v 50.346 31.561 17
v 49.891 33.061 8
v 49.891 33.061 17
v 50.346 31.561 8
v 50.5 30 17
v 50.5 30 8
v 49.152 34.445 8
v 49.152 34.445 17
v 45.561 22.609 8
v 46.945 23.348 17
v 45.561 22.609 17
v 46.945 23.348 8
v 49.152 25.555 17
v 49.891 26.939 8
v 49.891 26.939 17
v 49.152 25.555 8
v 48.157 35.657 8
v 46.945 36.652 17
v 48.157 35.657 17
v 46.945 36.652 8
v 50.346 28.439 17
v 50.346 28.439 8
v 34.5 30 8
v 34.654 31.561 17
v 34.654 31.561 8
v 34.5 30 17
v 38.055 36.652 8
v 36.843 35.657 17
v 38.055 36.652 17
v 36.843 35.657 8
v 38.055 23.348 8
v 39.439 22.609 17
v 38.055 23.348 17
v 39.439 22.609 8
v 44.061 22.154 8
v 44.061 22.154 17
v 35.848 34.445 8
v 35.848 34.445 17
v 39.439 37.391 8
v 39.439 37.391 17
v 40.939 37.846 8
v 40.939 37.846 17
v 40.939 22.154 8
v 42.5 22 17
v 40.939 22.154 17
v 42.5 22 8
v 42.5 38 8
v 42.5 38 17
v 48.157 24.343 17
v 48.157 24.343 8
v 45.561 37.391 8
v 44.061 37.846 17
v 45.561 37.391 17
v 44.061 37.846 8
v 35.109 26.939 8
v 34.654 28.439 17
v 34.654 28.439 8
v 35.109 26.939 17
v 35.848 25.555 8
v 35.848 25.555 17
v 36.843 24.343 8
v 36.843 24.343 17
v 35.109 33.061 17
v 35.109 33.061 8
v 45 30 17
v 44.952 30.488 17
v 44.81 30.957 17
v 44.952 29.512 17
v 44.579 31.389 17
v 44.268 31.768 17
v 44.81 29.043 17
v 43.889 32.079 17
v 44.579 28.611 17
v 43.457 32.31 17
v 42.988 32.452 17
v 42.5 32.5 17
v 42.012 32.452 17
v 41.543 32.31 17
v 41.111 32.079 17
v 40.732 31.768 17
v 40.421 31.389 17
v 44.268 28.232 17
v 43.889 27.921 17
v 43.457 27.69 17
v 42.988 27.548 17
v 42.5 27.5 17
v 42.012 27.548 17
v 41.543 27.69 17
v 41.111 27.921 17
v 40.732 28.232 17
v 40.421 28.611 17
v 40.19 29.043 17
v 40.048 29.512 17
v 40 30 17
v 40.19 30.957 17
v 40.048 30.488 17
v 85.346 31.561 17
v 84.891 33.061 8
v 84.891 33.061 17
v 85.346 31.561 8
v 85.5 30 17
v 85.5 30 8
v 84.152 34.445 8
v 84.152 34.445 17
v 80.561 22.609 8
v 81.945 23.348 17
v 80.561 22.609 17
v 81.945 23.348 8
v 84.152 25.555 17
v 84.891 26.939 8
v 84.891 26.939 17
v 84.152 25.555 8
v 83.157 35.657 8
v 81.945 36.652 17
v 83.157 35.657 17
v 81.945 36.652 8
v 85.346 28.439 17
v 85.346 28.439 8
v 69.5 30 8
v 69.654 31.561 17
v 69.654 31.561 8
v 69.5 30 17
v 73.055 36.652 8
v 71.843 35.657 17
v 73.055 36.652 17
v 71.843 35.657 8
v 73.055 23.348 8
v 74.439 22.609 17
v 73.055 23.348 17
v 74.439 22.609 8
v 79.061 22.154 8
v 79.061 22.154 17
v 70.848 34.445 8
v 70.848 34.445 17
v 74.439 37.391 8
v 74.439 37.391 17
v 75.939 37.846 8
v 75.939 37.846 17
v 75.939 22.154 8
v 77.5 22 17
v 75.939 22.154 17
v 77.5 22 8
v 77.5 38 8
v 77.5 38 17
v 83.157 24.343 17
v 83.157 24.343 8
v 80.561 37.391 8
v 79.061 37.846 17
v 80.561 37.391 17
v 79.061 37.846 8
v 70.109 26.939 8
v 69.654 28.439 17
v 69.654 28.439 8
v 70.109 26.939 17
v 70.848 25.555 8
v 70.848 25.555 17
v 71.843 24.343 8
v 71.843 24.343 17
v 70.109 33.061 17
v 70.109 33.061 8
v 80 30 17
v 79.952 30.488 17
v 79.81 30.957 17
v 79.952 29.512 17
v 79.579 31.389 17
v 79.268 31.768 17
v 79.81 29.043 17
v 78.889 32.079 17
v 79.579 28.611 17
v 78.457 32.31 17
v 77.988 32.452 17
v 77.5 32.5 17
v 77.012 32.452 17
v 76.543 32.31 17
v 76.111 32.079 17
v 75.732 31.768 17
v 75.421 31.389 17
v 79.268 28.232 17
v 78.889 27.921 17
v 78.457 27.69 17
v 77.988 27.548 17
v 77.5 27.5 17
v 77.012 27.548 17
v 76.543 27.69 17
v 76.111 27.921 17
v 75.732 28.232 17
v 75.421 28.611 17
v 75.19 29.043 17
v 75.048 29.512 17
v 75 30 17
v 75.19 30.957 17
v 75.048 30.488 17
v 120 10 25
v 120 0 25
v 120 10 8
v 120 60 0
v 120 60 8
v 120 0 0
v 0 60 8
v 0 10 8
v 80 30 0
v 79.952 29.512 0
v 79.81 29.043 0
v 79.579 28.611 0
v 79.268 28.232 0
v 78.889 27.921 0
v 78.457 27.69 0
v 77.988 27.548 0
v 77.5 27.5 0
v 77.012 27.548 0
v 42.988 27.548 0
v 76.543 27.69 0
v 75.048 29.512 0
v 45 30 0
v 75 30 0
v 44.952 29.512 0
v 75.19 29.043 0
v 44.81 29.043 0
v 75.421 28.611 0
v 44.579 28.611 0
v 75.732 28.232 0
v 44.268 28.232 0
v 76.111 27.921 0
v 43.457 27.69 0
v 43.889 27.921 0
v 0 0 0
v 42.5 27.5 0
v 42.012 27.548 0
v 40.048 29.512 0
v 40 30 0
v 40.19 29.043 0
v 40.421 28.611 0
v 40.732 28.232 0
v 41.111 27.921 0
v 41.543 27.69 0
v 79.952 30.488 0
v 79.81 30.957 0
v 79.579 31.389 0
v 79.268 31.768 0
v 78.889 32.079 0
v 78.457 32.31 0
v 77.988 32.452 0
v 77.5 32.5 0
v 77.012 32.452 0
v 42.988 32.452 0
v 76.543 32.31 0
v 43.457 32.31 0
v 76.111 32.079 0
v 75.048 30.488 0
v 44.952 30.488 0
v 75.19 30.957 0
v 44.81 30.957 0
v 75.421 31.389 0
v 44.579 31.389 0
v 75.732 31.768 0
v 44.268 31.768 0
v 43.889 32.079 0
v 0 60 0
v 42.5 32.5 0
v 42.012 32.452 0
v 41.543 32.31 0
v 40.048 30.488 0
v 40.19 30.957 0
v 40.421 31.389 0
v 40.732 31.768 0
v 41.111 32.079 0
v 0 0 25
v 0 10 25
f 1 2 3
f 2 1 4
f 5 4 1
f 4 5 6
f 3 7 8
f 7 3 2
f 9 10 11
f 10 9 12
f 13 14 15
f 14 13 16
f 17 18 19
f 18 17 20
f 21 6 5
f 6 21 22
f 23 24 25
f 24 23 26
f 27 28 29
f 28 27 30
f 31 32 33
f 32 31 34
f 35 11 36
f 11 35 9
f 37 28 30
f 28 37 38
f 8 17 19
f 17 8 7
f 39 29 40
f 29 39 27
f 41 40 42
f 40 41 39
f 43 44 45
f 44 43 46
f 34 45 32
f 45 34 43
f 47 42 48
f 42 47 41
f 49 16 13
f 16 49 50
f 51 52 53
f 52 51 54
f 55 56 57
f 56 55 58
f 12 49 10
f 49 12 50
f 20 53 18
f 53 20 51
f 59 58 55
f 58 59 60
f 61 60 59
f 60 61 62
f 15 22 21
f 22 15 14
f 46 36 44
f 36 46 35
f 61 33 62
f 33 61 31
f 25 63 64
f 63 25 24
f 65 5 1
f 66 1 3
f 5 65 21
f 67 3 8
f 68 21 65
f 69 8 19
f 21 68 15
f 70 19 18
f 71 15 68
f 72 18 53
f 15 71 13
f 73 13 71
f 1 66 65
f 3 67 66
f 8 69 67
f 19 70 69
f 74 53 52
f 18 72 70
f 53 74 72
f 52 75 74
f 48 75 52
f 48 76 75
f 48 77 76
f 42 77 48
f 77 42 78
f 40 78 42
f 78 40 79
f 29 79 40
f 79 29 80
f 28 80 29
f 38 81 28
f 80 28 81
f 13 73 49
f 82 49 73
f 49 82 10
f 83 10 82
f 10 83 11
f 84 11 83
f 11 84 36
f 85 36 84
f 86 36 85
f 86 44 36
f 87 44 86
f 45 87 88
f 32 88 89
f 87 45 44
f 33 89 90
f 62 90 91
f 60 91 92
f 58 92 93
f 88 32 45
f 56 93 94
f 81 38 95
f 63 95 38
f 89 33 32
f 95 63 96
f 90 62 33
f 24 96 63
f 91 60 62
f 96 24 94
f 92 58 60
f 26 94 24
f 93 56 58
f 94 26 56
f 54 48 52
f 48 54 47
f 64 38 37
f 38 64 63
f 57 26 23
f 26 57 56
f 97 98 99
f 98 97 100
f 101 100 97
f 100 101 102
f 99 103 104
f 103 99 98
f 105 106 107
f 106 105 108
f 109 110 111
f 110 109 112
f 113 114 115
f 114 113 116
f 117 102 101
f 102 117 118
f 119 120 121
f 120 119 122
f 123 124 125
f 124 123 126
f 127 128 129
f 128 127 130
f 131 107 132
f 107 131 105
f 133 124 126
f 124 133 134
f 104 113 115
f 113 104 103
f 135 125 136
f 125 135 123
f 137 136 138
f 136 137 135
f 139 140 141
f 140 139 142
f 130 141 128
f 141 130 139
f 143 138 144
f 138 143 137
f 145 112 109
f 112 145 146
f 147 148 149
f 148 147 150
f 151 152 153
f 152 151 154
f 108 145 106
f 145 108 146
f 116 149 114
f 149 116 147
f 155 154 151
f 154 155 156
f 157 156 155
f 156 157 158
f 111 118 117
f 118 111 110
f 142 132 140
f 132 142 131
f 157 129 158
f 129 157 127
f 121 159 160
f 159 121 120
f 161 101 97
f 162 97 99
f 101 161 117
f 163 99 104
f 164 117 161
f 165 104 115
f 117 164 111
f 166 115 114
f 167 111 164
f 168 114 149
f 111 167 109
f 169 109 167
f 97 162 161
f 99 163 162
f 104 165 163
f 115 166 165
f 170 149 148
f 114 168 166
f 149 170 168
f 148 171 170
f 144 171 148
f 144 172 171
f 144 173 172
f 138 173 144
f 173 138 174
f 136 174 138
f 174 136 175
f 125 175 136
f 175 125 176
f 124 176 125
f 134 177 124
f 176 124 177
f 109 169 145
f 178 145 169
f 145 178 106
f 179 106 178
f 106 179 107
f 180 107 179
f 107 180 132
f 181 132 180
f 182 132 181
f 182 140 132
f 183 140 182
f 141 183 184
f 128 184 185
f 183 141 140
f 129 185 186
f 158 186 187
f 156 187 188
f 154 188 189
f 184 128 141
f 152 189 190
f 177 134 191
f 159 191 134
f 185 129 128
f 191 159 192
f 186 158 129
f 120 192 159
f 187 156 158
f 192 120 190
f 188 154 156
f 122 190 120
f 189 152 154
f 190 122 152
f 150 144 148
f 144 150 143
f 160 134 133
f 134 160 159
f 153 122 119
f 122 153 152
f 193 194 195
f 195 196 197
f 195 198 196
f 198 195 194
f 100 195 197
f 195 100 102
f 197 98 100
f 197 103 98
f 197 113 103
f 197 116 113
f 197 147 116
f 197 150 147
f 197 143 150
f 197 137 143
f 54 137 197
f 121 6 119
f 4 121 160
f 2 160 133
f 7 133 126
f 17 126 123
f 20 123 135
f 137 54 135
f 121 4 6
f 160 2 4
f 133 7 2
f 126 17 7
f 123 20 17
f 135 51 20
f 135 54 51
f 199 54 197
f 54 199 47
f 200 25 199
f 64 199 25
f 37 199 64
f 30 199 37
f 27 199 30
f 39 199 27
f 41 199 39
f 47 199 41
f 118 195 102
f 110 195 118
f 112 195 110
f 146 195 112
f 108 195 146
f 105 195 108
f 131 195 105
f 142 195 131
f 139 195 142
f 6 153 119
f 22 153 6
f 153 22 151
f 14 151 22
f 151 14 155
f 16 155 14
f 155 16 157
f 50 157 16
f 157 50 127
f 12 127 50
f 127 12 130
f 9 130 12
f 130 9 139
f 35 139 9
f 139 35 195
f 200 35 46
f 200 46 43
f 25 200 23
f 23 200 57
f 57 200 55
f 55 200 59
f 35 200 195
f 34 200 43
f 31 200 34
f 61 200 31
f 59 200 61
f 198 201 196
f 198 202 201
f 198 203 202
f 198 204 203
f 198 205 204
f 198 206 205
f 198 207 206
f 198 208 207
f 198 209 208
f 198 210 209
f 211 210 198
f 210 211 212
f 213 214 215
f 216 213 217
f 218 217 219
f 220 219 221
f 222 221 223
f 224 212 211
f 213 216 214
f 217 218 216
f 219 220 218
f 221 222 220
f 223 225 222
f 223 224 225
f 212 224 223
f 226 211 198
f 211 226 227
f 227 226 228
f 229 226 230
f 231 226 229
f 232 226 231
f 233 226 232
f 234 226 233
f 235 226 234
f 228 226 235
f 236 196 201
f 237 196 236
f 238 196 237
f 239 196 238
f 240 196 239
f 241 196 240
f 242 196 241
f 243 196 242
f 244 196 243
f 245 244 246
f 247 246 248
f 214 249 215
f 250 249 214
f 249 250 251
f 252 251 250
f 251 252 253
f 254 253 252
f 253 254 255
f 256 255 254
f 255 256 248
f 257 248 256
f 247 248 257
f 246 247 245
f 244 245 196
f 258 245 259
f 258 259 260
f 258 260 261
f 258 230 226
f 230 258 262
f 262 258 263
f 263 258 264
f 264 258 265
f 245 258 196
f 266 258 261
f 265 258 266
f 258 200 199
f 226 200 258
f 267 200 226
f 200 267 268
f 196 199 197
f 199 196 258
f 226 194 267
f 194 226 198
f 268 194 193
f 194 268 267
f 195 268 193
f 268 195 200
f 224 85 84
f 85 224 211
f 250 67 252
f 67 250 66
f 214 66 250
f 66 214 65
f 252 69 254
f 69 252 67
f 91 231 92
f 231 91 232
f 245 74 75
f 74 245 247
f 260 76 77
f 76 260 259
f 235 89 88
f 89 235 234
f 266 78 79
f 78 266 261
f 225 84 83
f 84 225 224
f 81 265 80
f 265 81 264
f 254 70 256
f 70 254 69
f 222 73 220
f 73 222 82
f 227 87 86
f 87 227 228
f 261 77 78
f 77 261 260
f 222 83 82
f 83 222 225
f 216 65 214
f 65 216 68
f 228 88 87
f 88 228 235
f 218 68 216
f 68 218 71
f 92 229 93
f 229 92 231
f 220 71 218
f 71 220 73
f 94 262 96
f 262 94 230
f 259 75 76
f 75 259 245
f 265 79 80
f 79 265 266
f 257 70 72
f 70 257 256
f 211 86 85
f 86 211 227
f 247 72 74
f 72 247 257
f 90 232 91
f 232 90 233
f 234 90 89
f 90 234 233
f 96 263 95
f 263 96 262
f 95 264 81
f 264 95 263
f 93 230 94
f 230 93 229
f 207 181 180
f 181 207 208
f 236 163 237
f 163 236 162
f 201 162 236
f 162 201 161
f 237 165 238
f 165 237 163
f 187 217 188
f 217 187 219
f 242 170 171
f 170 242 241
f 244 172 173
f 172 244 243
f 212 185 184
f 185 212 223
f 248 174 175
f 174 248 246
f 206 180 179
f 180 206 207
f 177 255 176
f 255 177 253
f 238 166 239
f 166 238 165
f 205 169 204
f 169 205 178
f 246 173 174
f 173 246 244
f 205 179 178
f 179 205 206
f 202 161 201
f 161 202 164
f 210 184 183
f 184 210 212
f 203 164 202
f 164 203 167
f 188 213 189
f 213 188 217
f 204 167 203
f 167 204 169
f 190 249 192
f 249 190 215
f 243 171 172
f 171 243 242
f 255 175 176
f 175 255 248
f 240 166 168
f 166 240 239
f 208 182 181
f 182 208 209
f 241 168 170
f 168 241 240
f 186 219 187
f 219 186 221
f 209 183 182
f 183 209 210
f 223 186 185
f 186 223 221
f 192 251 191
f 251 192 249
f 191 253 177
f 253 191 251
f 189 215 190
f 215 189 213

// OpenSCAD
$fn = 32;

// ----------------------------------------------------------------------
// Drill jig: fence jig
// ----------------------------------------------------------------------

// --- parameters (mm) ---
plate_l = 120;            // plate length, X
plate_w = 60;             // plate width, Y
plate_t = 8;              // plate thickness
boss_d = 16;              // guide boss diameter
boss_h = 10;              // boss height above the plate
guide_d = 5;              // guide hole diameter
boss_pitch = 35;          // boss pitch
fence_h = 18;             // fence height above the plate
fence_t = 10;             // fence thickness
fit_tol = 0.1;            // tolerance for press fits, mm
free_tol = 0.3;           // tolerance for clearance fits, mm

n_boss = 2;  // guide bosses
boss_x0 = (plate_l - (n_boss - 1) * boss_pitch) / 2;  // first boss X
boss_top = plate_t - 1 + boss_h;  // boss crown height
fence_top = plate_t - 1 + fence_h;  // fence crown height
total_h = max([fence_top, boss_top]);  // overall height

difference() {
  union() {
  cube([plate_l, plate_w, plate_t]);
  for (i = [0 : n_boss - 1])
    translate([boss_x0 + i * boss_pitch, plate_w / 2, plate_t - 1])
      cylinder(h = boss_h, d = boss_d);
  translate([0, 0, plate_t - 1]) cube([plate_l, fence_t, fence_h]);
  }
  for (i = [0 : n_boss - 1])
    translate([boss_x0 + i * boss_pitch, plate_w / 2, -1])
      cylinder(h = plate_t + boss_h, d = guide_d);
}
